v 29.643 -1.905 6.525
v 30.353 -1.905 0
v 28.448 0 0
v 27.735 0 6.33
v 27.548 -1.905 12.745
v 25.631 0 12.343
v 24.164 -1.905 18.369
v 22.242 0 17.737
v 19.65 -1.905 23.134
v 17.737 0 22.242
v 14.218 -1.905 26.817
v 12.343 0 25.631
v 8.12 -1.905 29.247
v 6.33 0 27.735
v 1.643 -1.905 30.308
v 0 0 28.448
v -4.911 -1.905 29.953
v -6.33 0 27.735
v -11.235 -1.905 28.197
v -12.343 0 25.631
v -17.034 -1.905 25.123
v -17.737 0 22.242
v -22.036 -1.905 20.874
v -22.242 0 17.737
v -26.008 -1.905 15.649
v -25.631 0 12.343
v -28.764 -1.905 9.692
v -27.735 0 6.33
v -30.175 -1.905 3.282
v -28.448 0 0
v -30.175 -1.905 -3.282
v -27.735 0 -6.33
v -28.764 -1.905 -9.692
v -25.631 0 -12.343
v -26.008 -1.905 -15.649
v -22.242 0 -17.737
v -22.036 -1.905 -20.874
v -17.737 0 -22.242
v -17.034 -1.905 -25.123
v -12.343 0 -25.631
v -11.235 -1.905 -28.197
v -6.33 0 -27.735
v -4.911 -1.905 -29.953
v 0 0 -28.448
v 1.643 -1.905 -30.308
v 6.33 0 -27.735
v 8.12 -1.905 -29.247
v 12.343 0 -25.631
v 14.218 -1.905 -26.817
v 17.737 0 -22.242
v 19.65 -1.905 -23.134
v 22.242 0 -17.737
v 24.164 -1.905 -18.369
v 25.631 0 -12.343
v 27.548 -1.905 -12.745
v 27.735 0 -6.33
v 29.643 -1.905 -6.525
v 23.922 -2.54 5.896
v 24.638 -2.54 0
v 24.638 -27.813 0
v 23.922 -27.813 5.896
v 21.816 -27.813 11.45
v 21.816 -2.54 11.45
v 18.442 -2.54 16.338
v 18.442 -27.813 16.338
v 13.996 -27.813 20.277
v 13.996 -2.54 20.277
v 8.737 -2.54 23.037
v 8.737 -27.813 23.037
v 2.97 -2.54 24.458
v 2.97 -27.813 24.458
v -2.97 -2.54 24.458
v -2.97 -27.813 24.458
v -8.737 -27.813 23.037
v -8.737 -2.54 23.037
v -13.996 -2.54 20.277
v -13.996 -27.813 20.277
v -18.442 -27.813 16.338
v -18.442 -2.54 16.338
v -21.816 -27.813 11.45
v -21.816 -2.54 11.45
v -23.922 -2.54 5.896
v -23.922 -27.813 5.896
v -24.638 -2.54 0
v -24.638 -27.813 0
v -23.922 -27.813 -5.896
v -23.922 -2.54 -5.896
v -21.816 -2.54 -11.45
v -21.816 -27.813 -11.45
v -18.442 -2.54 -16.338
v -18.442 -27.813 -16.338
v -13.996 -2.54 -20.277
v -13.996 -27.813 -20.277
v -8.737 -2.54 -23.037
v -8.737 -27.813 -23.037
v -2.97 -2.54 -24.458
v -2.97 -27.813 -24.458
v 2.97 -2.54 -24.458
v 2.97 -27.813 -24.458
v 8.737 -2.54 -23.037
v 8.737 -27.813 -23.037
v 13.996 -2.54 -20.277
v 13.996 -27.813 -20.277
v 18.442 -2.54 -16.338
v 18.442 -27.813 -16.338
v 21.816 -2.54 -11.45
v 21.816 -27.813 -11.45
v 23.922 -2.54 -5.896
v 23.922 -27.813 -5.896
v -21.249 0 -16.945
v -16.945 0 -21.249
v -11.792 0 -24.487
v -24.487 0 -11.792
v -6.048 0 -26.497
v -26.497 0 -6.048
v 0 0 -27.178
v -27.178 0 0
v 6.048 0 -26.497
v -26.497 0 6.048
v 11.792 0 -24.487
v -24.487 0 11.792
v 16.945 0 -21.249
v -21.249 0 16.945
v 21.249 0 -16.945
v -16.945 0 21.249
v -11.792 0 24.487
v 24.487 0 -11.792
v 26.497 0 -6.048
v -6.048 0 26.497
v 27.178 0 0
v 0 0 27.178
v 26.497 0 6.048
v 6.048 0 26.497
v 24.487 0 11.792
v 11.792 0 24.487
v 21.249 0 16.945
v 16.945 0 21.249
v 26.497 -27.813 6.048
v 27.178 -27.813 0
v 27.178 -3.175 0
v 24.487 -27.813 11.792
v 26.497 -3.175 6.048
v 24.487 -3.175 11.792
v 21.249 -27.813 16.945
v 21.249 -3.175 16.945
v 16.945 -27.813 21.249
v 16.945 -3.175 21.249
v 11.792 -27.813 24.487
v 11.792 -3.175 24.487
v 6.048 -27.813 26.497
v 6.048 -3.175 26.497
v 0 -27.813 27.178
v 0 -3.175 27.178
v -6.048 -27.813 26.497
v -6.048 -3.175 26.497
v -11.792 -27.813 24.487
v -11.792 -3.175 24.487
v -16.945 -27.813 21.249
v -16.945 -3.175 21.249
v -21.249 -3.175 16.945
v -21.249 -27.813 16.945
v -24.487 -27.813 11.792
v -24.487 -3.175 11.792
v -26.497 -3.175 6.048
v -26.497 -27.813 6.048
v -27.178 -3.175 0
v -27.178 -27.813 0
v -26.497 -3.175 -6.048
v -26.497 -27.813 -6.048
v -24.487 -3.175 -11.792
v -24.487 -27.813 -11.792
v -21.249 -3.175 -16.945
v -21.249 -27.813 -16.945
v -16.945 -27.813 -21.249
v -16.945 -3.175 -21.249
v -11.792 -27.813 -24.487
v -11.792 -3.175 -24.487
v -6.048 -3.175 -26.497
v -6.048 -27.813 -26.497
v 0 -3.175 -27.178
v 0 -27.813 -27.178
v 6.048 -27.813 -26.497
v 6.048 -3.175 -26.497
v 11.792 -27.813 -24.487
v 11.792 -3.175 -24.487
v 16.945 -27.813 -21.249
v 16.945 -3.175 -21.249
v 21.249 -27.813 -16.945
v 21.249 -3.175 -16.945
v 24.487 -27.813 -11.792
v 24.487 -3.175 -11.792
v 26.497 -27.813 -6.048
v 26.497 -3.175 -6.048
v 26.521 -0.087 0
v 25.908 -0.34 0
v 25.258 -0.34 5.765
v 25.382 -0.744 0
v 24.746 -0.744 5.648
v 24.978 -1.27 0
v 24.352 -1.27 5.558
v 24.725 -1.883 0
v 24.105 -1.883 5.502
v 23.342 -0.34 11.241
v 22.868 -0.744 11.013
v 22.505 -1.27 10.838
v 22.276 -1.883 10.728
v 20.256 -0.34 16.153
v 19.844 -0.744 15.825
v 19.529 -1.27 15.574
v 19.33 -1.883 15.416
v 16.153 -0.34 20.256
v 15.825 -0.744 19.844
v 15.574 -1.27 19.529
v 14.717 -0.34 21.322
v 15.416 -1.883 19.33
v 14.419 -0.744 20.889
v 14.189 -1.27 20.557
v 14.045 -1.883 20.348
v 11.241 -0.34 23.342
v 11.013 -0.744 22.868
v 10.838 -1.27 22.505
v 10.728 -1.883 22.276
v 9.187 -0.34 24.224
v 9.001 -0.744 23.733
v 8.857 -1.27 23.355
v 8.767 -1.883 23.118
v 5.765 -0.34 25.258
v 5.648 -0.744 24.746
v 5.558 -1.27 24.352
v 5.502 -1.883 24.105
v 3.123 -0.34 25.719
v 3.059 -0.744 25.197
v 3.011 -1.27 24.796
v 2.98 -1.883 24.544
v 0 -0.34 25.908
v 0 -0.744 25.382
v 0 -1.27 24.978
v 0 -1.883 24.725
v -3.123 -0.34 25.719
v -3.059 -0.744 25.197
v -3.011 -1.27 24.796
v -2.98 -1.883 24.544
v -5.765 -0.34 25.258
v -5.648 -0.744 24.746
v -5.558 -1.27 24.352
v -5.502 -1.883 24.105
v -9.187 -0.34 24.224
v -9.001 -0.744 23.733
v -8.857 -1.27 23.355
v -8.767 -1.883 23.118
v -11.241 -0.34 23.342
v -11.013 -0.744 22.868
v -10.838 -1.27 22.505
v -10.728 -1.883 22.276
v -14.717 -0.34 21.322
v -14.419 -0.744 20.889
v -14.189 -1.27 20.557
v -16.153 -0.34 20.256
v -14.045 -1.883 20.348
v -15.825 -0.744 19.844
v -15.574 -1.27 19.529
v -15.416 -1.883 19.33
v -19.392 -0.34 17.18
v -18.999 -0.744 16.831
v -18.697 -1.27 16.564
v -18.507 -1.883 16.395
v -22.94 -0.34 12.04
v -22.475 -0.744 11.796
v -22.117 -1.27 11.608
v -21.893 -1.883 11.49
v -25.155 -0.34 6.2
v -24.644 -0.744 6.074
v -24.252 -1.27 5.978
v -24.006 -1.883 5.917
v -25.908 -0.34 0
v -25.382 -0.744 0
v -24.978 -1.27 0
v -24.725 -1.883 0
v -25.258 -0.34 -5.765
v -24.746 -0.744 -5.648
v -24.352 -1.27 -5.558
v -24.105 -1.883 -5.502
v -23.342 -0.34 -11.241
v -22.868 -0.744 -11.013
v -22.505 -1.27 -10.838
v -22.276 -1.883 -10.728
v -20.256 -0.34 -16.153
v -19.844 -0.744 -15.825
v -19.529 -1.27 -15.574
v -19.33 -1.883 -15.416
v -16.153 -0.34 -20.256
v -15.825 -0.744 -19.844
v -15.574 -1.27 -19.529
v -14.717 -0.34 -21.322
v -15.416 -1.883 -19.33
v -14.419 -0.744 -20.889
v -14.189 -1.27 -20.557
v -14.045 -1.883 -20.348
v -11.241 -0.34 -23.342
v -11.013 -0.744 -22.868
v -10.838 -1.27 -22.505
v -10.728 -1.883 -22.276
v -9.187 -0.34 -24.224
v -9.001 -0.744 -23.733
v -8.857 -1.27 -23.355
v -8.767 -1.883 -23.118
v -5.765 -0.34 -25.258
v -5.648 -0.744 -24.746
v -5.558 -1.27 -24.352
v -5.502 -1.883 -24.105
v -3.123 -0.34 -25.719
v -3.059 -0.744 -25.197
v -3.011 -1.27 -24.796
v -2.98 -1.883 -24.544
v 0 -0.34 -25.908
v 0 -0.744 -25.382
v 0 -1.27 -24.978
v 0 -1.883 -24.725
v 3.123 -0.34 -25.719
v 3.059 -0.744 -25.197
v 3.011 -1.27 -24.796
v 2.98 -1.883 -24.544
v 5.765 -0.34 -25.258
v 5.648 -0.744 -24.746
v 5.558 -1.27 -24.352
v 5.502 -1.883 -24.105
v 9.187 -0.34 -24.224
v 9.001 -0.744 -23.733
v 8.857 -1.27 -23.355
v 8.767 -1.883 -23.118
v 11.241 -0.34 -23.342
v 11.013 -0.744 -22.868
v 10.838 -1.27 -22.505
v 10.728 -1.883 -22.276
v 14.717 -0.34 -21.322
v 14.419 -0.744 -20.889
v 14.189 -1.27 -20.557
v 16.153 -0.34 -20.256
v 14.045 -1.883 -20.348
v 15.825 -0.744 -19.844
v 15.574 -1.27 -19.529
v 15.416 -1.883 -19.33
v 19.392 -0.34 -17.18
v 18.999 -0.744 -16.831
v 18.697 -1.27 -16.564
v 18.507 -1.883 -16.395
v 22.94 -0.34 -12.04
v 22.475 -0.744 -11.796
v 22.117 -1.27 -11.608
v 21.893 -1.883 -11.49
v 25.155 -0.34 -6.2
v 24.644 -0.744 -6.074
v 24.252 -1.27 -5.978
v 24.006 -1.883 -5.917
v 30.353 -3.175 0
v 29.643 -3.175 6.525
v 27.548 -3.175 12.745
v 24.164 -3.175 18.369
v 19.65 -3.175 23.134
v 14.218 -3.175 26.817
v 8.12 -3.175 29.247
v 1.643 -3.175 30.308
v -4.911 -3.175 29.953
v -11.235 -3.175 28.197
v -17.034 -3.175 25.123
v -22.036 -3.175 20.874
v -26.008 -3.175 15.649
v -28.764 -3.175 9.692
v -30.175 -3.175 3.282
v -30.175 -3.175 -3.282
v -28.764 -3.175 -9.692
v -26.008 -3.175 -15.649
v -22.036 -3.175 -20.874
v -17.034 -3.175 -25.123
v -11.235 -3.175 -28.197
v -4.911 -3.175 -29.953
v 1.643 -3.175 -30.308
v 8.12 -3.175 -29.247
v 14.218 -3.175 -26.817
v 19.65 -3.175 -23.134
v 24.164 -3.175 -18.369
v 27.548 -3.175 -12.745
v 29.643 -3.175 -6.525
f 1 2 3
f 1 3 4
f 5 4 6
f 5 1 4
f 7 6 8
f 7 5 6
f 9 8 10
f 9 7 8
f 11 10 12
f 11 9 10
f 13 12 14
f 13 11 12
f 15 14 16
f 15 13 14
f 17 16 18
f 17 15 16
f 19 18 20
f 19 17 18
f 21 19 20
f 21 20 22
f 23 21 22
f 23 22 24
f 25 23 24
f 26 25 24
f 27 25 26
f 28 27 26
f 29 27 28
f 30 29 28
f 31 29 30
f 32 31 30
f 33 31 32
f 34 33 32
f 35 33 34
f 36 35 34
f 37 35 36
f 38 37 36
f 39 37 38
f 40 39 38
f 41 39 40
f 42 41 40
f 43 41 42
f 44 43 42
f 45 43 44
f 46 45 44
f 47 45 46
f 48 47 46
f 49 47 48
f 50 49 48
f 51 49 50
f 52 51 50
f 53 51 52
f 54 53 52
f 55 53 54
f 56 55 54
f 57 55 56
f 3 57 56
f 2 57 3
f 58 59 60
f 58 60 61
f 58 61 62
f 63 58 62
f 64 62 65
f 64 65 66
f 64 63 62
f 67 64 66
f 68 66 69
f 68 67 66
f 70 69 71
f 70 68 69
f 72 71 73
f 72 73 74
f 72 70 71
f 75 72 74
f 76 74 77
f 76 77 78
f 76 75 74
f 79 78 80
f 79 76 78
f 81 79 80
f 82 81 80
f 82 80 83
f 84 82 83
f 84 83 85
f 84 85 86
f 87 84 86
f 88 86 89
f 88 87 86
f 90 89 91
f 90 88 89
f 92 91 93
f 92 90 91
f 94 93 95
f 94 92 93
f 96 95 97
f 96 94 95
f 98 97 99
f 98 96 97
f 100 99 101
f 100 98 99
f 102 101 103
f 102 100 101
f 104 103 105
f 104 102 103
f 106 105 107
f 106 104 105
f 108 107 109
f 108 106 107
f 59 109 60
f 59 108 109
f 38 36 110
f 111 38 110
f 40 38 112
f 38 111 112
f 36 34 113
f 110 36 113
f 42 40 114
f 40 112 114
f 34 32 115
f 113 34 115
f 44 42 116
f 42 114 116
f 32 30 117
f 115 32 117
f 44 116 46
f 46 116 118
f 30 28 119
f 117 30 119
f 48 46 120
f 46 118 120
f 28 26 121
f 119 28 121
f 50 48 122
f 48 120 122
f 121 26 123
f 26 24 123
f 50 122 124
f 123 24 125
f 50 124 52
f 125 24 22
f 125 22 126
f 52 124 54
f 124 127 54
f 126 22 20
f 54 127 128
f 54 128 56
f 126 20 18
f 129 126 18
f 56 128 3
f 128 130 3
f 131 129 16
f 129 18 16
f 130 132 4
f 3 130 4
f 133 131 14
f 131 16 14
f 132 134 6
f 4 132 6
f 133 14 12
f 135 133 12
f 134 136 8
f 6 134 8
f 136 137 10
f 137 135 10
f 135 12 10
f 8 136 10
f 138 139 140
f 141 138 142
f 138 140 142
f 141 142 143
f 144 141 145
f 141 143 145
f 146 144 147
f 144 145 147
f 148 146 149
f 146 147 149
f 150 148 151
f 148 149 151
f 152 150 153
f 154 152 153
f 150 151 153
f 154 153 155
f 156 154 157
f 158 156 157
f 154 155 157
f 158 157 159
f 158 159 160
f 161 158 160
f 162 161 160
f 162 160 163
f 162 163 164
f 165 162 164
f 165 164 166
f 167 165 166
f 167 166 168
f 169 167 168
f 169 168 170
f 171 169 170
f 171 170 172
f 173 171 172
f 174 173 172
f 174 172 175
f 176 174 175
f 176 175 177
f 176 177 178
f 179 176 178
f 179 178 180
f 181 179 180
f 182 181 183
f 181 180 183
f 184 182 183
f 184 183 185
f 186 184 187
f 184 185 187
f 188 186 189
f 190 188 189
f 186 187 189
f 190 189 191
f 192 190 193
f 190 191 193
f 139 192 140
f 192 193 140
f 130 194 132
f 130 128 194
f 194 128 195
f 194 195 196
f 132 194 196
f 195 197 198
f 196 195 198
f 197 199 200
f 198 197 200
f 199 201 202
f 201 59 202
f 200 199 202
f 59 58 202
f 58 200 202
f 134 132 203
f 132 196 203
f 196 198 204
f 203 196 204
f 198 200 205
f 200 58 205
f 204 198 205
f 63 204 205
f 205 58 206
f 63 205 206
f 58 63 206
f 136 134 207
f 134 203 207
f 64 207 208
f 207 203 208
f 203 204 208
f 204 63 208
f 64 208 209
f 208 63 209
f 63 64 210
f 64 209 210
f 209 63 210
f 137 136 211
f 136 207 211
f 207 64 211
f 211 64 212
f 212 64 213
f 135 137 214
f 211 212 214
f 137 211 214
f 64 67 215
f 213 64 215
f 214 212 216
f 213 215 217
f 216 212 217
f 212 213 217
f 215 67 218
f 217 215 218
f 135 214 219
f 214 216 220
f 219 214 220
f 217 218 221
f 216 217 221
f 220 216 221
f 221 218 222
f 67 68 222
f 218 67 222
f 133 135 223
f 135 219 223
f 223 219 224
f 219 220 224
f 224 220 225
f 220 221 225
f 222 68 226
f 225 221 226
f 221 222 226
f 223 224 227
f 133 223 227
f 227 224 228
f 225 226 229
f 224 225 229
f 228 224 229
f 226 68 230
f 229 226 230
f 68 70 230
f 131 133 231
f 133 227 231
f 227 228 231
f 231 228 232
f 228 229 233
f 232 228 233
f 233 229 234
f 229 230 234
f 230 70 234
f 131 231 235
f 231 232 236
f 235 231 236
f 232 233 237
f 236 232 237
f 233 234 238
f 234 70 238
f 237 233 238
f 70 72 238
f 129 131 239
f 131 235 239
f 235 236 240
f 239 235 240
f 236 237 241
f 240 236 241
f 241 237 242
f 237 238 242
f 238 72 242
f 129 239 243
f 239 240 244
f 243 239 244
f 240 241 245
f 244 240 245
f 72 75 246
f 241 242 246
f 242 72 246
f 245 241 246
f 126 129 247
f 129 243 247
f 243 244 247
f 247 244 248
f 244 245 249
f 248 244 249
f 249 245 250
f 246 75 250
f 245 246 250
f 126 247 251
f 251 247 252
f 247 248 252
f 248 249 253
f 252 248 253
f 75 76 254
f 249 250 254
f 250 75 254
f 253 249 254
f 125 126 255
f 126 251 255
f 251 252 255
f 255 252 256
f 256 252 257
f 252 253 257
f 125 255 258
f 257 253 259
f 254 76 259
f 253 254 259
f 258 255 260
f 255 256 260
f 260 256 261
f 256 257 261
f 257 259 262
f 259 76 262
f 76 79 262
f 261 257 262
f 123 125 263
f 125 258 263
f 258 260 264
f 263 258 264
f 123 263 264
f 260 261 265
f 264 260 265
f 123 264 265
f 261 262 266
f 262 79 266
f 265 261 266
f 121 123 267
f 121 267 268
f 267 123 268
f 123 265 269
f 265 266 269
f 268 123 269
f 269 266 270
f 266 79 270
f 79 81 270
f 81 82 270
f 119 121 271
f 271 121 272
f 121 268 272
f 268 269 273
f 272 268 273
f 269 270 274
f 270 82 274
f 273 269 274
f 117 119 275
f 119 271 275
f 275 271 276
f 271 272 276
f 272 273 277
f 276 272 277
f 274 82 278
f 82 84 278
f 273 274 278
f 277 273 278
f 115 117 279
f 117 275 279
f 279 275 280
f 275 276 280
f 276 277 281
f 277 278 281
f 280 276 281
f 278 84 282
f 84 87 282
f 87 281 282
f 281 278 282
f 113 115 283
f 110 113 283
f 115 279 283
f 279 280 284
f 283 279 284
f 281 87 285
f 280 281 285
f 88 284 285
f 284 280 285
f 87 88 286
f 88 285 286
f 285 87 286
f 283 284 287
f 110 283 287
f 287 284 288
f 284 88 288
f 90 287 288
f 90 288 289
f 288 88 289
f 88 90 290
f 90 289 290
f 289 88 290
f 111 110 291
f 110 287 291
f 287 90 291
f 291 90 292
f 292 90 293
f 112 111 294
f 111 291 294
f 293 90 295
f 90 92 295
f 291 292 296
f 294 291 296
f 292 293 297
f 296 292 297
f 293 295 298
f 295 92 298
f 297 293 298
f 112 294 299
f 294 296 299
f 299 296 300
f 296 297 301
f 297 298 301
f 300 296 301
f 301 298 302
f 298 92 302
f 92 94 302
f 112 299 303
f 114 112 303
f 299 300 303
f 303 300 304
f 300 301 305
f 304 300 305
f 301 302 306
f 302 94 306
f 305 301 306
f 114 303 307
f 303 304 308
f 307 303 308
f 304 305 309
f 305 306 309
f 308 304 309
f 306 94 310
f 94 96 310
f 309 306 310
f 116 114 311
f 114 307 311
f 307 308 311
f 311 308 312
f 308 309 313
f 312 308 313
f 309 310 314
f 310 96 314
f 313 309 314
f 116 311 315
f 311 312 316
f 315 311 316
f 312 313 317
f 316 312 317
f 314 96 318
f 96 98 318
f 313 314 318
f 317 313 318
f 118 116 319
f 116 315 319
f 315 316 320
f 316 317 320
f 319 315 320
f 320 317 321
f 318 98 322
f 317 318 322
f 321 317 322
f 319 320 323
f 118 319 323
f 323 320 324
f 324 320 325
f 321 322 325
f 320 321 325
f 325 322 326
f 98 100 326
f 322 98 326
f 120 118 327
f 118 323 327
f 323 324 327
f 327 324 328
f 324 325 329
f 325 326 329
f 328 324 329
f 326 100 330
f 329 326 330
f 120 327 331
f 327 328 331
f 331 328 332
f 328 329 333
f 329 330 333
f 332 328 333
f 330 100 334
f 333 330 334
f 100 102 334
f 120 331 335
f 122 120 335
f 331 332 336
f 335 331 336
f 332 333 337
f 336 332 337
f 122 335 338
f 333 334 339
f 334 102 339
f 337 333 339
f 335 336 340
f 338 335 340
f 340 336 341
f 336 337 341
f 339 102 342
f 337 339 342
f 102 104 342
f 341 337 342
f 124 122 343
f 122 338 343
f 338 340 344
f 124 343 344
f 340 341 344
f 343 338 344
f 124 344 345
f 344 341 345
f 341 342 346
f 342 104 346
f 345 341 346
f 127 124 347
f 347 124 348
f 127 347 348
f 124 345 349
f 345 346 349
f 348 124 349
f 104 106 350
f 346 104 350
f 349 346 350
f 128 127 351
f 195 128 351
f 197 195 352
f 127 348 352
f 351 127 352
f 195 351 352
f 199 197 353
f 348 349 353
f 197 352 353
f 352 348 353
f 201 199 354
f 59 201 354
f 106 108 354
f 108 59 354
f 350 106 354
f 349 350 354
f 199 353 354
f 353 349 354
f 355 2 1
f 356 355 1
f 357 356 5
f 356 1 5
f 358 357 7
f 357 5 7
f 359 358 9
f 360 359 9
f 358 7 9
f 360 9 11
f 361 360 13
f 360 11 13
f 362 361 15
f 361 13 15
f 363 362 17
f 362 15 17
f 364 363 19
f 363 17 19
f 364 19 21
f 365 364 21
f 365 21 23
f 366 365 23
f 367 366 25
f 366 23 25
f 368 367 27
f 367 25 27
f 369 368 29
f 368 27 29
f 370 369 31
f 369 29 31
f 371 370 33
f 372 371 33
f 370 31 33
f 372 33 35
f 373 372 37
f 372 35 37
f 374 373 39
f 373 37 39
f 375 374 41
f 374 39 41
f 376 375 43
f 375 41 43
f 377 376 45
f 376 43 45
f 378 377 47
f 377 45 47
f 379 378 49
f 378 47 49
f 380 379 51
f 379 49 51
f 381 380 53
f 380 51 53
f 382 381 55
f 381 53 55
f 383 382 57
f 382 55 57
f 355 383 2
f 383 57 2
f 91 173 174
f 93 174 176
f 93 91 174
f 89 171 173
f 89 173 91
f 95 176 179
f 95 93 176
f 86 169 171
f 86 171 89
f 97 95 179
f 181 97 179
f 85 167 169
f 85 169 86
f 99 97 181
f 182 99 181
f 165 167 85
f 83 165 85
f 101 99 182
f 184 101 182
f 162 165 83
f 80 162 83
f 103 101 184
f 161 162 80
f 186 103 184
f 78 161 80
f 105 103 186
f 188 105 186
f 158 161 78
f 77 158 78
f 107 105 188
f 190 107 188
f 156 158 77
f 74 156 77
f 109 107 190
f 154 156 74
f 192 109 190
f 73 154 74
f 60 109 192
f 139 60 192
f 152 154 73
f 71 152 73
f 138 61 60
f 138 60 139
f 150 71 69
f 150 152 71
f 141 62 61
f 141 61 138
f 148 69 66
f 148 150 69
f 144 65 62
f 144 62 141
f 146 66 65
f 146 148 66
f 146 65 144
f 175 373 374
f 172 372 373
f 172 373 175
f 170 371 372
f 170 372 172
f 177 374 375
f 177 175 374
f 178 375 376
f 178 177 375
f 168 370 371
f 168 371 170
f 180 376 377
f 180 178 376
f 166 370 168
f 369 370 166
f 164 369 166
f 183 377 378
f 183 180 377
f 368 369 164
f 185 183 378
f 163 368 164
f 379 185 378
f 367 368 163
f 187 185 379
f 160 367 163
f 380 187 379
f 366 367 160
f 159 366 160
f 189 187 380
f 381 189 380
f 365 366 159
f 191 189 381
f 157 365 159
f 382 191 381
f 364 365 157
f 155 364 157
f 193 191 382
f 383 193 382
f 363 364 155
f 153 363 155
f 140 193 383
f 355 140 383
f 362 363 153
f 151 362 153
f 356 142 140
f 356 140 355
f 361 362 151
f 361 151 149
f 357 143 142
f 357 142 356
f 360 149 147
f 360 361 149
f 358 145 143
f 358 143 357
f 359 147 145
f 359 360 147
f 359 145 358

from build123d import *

# Parameters (mm, degrees)
F0_R     = 27.178
F0_R_2   = 24.638
F1_DEPTH = 27.813
F0_R_3   = 30.353
F2_DEPTH = 3.175
F3_R     = 2.54
F4_SIZE  = 1.905


with BuildPart() as f1:
    # F0 (on Front) → F1 (new body)
    with BuildSketch(Plane.XZ):
        Circle(F0_R)
        Circle(F0_R_2, mode=Mode.SUBTRACT)
    extrude(amount=F1_DEPTH)

    # F0 (on Front) → F2 (join)
    with BuildSketch(Plane.XZ):
        Circle(F0_R_3)
        Circle(F0_R, mode=Mode.SUBTRACT)
    extrude(amount=F2_DEPTH)

    # F3
    f3_edges = [f1.edges().sort_by_distance(p)[0] for p in [
        (-24.638, 0, 0),
    ]]
    fillet(f3_edges, radius=F3_R)

    # F4
    f4_edges = [f1.edges().sort_by_distance(p)[0] for p in [
        (-30.353, 0, 0),
    ]]
    chamfer(f4_edges, length=F4_SIZE)


solid = f1.part
